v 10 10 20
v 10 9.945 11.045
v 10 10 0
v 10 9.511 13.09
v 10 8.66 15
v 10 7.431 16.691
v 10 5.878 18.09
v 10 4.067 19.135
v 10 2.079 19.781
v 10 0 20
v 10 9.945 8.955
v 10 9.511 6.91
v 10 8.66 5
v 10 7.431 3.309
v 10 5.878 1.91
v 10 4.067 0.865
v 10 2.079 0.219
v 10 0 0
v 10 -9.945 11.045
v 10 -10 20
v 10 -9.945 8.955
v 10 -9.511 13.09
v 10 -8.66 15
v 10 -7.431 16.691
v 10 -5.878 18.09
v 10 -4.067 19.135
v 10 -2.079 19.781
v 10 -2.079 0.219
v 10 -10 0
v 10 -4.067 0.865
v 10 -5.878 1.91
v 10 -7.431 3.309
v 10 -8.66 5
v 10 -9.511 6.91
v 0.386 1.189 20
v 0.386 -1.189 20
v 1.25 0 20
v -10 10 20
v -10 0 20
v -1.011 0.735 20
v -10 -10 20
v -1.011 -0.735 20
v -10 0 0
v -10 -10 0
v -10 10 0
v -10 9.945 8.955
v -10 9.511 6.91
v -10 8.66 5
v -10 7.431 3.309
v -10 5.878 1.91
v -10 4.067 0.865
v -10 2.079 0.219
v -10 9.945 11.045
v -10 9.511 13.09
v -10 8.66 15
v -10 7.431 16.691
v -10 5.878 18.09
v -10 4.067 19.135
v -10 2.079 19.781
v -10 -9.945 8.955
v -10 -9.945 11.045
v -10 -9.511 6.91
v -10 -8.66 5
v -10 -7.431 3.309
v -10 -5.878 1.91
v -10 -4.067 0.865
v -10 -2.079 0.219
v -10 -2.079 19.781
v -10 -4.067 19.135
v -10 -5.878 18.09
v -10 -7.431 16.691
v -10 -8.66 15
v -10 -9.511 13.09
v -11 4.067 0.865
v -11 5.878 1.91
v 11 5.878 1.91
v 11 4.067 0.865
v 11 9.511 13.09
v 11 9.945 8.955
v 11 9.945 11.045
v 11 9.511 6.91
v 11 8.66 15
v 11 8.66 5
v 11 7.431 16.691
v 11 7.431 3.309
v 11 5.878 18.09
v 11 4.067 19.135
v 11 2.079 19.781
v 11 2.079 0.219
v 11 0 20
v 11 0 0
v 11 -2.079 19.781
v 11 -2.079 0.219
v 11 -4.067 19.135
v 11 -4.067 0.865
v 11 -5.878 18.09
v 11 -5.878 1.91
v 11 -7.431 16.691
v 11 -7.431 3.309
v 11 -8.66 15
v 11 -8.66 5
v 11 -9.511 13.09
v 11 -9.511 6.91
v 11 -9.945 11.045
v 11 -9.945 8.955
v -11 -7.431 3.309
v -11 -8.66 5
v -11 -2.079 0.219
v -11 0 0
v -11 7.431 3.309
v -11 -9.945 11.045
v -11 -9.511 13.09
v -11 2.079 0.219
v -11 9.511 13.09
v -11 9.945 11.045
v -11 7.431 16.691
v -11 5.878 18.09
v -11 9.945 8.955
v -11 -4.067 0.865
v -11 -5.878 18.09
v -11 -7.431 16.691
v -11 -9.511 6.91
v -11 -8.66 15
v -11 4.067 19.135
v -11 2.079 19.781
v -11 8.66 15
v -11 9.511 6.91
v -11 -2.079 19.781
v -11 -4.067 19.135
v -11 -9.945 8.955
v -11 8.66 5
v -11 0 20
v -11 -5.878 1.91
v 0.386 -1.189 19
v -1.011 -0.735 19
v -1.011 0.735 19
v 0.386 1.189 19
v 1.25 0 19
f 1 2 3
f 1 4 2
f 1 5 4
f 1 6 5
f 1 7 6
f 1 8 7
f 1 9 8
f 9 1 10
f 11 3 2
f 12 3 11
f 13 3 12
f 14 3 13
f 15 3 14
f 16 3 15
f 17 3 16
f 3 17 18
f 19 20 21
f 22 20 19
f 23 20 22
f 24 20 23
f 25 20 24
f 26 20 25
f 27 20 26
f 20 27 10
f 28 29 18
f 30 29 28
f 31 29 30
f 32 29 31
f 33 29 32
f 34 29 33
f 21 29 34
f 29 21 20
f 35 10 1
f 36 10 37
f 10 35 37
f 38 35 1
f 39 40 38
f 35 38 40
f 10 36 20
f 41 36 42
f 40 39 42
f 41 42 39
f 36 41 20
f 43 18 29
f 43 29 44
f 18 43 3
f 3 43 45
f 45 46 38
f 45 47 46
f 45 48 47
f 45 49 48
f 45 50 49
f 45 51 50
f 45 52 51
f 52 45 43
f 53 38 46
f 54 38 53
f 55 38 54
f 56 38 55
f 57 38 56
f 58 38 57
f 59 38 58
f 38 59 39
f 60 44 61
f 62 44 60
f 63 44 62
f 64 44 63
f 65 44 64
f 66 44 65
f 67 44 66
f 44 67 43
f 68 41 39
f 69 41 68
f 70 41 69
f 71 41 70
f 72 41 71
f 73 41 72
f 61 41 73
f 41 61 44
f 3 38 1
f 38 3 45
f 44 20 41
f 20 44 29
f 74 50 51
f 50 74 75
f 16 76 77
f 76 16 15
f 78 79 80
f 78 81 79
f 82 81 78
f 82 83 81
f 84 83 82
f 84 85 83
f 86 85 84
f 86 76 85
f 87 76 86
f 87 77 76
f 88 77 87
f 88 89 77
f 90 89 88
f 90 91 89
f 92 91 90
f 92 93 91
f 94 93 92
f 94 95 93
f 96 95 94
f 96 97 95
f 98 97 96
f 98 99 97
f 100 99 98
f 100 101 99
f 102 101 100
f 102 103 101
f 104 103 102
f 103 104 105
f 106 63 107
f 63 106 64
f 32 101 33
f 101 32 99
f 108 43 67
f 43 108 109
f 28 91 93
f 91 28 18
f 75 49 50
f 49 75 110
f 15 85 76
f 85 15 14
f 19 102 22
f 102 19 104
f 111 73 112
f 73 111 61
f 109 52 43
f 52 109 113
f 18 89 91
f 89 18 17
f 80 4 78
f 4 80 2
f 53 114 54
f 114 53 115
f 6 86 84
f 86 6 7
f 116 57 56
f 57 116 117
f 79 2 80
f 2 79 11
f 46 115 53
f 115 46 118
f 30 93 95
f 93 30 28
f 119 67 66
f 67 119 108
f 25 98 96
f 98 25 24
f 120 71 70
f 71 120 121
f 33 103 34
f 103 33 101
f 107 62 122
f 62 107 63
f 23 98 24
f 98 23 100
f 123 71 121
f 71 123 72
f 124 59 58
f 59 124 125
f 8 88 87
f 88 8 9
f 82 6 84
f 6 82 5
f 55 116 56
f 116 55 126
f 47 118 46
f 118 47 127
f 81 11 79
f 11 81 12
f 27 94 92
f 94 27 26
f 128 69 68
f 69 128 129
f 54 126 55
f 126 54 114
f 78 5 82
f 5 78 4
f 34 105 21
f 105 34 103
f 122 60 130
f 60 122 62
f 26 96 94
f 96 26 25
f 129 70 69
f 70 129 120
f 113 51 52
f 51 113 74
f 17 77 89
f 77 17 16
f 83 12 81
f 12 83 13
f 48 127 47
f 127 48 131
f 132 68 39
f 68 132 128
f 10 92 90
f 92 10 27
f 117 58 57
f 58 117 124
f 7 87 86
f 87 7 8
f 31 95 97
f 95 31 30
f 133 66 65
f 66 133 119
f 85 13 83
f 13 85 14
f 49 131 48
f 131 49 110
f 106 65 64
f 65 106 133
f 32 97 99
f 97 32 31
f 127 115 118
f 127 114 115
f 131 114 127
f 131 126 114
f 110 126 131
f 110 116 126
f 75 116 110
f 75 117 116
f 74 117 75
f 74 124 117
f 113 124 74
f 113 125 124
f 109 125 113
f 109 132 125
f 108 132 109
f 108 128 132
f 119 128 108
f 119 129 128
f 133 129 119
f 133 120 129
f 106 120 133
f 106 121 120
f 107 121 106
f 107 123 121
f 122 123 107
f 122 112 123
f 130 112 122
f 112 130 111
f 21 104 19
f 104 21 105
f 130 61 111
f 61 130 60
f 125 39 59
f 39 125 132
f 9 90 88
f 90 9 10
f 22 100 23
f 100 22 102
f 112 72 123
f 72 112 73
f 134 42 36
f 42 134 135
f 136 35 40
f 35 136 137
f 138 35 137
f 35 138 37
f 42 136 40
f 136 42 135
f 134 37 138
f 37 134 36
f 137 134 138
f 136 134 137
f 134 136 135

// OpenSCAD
// [FL_INDEX: keywords="openscad, 3d_parametric, asgd, csg_solid" | COT="Parametric OpenSCAD design from 3DCodeverse"]
// Title: asgd

cube_size = 20; // [10:Small,20:Medium,30:Large]

hole_diameter = 2.5;
hole_radius = hole_diameter/2;

// How deep should the center hole be?
hole_depth = 1; // [0,1,5,50]

show_wheels = "yes"; // [yes,no]

// How thick should the side wheels be?
wheel_thickness = 1; // [1:20]

// ignore this variable!
// foo=1;

// don't turn functions into params!
function BEZ03(u) = pow((1-u), 3);

// ignore variable values
bing = 3+4;
baz = 3 / hole_depth;

difference() {
  union() {
    translate([0, 0, cube_size/2]) cube([cube_size,cube_size,cube_size], center=true);
    if (show_wheels == "yes") {
      translate([0, 0, cube_size/2]) rotate([0, 90, 0]) {
        cylinder(r=cube_size/2, h=cube_size+(wheel_thickness*2), center=true);
      }
    }
  }
  translate([0, 0, cube_size-hole_depth]) cylinder(r=hole_radius, h=hole_depth);
}          
